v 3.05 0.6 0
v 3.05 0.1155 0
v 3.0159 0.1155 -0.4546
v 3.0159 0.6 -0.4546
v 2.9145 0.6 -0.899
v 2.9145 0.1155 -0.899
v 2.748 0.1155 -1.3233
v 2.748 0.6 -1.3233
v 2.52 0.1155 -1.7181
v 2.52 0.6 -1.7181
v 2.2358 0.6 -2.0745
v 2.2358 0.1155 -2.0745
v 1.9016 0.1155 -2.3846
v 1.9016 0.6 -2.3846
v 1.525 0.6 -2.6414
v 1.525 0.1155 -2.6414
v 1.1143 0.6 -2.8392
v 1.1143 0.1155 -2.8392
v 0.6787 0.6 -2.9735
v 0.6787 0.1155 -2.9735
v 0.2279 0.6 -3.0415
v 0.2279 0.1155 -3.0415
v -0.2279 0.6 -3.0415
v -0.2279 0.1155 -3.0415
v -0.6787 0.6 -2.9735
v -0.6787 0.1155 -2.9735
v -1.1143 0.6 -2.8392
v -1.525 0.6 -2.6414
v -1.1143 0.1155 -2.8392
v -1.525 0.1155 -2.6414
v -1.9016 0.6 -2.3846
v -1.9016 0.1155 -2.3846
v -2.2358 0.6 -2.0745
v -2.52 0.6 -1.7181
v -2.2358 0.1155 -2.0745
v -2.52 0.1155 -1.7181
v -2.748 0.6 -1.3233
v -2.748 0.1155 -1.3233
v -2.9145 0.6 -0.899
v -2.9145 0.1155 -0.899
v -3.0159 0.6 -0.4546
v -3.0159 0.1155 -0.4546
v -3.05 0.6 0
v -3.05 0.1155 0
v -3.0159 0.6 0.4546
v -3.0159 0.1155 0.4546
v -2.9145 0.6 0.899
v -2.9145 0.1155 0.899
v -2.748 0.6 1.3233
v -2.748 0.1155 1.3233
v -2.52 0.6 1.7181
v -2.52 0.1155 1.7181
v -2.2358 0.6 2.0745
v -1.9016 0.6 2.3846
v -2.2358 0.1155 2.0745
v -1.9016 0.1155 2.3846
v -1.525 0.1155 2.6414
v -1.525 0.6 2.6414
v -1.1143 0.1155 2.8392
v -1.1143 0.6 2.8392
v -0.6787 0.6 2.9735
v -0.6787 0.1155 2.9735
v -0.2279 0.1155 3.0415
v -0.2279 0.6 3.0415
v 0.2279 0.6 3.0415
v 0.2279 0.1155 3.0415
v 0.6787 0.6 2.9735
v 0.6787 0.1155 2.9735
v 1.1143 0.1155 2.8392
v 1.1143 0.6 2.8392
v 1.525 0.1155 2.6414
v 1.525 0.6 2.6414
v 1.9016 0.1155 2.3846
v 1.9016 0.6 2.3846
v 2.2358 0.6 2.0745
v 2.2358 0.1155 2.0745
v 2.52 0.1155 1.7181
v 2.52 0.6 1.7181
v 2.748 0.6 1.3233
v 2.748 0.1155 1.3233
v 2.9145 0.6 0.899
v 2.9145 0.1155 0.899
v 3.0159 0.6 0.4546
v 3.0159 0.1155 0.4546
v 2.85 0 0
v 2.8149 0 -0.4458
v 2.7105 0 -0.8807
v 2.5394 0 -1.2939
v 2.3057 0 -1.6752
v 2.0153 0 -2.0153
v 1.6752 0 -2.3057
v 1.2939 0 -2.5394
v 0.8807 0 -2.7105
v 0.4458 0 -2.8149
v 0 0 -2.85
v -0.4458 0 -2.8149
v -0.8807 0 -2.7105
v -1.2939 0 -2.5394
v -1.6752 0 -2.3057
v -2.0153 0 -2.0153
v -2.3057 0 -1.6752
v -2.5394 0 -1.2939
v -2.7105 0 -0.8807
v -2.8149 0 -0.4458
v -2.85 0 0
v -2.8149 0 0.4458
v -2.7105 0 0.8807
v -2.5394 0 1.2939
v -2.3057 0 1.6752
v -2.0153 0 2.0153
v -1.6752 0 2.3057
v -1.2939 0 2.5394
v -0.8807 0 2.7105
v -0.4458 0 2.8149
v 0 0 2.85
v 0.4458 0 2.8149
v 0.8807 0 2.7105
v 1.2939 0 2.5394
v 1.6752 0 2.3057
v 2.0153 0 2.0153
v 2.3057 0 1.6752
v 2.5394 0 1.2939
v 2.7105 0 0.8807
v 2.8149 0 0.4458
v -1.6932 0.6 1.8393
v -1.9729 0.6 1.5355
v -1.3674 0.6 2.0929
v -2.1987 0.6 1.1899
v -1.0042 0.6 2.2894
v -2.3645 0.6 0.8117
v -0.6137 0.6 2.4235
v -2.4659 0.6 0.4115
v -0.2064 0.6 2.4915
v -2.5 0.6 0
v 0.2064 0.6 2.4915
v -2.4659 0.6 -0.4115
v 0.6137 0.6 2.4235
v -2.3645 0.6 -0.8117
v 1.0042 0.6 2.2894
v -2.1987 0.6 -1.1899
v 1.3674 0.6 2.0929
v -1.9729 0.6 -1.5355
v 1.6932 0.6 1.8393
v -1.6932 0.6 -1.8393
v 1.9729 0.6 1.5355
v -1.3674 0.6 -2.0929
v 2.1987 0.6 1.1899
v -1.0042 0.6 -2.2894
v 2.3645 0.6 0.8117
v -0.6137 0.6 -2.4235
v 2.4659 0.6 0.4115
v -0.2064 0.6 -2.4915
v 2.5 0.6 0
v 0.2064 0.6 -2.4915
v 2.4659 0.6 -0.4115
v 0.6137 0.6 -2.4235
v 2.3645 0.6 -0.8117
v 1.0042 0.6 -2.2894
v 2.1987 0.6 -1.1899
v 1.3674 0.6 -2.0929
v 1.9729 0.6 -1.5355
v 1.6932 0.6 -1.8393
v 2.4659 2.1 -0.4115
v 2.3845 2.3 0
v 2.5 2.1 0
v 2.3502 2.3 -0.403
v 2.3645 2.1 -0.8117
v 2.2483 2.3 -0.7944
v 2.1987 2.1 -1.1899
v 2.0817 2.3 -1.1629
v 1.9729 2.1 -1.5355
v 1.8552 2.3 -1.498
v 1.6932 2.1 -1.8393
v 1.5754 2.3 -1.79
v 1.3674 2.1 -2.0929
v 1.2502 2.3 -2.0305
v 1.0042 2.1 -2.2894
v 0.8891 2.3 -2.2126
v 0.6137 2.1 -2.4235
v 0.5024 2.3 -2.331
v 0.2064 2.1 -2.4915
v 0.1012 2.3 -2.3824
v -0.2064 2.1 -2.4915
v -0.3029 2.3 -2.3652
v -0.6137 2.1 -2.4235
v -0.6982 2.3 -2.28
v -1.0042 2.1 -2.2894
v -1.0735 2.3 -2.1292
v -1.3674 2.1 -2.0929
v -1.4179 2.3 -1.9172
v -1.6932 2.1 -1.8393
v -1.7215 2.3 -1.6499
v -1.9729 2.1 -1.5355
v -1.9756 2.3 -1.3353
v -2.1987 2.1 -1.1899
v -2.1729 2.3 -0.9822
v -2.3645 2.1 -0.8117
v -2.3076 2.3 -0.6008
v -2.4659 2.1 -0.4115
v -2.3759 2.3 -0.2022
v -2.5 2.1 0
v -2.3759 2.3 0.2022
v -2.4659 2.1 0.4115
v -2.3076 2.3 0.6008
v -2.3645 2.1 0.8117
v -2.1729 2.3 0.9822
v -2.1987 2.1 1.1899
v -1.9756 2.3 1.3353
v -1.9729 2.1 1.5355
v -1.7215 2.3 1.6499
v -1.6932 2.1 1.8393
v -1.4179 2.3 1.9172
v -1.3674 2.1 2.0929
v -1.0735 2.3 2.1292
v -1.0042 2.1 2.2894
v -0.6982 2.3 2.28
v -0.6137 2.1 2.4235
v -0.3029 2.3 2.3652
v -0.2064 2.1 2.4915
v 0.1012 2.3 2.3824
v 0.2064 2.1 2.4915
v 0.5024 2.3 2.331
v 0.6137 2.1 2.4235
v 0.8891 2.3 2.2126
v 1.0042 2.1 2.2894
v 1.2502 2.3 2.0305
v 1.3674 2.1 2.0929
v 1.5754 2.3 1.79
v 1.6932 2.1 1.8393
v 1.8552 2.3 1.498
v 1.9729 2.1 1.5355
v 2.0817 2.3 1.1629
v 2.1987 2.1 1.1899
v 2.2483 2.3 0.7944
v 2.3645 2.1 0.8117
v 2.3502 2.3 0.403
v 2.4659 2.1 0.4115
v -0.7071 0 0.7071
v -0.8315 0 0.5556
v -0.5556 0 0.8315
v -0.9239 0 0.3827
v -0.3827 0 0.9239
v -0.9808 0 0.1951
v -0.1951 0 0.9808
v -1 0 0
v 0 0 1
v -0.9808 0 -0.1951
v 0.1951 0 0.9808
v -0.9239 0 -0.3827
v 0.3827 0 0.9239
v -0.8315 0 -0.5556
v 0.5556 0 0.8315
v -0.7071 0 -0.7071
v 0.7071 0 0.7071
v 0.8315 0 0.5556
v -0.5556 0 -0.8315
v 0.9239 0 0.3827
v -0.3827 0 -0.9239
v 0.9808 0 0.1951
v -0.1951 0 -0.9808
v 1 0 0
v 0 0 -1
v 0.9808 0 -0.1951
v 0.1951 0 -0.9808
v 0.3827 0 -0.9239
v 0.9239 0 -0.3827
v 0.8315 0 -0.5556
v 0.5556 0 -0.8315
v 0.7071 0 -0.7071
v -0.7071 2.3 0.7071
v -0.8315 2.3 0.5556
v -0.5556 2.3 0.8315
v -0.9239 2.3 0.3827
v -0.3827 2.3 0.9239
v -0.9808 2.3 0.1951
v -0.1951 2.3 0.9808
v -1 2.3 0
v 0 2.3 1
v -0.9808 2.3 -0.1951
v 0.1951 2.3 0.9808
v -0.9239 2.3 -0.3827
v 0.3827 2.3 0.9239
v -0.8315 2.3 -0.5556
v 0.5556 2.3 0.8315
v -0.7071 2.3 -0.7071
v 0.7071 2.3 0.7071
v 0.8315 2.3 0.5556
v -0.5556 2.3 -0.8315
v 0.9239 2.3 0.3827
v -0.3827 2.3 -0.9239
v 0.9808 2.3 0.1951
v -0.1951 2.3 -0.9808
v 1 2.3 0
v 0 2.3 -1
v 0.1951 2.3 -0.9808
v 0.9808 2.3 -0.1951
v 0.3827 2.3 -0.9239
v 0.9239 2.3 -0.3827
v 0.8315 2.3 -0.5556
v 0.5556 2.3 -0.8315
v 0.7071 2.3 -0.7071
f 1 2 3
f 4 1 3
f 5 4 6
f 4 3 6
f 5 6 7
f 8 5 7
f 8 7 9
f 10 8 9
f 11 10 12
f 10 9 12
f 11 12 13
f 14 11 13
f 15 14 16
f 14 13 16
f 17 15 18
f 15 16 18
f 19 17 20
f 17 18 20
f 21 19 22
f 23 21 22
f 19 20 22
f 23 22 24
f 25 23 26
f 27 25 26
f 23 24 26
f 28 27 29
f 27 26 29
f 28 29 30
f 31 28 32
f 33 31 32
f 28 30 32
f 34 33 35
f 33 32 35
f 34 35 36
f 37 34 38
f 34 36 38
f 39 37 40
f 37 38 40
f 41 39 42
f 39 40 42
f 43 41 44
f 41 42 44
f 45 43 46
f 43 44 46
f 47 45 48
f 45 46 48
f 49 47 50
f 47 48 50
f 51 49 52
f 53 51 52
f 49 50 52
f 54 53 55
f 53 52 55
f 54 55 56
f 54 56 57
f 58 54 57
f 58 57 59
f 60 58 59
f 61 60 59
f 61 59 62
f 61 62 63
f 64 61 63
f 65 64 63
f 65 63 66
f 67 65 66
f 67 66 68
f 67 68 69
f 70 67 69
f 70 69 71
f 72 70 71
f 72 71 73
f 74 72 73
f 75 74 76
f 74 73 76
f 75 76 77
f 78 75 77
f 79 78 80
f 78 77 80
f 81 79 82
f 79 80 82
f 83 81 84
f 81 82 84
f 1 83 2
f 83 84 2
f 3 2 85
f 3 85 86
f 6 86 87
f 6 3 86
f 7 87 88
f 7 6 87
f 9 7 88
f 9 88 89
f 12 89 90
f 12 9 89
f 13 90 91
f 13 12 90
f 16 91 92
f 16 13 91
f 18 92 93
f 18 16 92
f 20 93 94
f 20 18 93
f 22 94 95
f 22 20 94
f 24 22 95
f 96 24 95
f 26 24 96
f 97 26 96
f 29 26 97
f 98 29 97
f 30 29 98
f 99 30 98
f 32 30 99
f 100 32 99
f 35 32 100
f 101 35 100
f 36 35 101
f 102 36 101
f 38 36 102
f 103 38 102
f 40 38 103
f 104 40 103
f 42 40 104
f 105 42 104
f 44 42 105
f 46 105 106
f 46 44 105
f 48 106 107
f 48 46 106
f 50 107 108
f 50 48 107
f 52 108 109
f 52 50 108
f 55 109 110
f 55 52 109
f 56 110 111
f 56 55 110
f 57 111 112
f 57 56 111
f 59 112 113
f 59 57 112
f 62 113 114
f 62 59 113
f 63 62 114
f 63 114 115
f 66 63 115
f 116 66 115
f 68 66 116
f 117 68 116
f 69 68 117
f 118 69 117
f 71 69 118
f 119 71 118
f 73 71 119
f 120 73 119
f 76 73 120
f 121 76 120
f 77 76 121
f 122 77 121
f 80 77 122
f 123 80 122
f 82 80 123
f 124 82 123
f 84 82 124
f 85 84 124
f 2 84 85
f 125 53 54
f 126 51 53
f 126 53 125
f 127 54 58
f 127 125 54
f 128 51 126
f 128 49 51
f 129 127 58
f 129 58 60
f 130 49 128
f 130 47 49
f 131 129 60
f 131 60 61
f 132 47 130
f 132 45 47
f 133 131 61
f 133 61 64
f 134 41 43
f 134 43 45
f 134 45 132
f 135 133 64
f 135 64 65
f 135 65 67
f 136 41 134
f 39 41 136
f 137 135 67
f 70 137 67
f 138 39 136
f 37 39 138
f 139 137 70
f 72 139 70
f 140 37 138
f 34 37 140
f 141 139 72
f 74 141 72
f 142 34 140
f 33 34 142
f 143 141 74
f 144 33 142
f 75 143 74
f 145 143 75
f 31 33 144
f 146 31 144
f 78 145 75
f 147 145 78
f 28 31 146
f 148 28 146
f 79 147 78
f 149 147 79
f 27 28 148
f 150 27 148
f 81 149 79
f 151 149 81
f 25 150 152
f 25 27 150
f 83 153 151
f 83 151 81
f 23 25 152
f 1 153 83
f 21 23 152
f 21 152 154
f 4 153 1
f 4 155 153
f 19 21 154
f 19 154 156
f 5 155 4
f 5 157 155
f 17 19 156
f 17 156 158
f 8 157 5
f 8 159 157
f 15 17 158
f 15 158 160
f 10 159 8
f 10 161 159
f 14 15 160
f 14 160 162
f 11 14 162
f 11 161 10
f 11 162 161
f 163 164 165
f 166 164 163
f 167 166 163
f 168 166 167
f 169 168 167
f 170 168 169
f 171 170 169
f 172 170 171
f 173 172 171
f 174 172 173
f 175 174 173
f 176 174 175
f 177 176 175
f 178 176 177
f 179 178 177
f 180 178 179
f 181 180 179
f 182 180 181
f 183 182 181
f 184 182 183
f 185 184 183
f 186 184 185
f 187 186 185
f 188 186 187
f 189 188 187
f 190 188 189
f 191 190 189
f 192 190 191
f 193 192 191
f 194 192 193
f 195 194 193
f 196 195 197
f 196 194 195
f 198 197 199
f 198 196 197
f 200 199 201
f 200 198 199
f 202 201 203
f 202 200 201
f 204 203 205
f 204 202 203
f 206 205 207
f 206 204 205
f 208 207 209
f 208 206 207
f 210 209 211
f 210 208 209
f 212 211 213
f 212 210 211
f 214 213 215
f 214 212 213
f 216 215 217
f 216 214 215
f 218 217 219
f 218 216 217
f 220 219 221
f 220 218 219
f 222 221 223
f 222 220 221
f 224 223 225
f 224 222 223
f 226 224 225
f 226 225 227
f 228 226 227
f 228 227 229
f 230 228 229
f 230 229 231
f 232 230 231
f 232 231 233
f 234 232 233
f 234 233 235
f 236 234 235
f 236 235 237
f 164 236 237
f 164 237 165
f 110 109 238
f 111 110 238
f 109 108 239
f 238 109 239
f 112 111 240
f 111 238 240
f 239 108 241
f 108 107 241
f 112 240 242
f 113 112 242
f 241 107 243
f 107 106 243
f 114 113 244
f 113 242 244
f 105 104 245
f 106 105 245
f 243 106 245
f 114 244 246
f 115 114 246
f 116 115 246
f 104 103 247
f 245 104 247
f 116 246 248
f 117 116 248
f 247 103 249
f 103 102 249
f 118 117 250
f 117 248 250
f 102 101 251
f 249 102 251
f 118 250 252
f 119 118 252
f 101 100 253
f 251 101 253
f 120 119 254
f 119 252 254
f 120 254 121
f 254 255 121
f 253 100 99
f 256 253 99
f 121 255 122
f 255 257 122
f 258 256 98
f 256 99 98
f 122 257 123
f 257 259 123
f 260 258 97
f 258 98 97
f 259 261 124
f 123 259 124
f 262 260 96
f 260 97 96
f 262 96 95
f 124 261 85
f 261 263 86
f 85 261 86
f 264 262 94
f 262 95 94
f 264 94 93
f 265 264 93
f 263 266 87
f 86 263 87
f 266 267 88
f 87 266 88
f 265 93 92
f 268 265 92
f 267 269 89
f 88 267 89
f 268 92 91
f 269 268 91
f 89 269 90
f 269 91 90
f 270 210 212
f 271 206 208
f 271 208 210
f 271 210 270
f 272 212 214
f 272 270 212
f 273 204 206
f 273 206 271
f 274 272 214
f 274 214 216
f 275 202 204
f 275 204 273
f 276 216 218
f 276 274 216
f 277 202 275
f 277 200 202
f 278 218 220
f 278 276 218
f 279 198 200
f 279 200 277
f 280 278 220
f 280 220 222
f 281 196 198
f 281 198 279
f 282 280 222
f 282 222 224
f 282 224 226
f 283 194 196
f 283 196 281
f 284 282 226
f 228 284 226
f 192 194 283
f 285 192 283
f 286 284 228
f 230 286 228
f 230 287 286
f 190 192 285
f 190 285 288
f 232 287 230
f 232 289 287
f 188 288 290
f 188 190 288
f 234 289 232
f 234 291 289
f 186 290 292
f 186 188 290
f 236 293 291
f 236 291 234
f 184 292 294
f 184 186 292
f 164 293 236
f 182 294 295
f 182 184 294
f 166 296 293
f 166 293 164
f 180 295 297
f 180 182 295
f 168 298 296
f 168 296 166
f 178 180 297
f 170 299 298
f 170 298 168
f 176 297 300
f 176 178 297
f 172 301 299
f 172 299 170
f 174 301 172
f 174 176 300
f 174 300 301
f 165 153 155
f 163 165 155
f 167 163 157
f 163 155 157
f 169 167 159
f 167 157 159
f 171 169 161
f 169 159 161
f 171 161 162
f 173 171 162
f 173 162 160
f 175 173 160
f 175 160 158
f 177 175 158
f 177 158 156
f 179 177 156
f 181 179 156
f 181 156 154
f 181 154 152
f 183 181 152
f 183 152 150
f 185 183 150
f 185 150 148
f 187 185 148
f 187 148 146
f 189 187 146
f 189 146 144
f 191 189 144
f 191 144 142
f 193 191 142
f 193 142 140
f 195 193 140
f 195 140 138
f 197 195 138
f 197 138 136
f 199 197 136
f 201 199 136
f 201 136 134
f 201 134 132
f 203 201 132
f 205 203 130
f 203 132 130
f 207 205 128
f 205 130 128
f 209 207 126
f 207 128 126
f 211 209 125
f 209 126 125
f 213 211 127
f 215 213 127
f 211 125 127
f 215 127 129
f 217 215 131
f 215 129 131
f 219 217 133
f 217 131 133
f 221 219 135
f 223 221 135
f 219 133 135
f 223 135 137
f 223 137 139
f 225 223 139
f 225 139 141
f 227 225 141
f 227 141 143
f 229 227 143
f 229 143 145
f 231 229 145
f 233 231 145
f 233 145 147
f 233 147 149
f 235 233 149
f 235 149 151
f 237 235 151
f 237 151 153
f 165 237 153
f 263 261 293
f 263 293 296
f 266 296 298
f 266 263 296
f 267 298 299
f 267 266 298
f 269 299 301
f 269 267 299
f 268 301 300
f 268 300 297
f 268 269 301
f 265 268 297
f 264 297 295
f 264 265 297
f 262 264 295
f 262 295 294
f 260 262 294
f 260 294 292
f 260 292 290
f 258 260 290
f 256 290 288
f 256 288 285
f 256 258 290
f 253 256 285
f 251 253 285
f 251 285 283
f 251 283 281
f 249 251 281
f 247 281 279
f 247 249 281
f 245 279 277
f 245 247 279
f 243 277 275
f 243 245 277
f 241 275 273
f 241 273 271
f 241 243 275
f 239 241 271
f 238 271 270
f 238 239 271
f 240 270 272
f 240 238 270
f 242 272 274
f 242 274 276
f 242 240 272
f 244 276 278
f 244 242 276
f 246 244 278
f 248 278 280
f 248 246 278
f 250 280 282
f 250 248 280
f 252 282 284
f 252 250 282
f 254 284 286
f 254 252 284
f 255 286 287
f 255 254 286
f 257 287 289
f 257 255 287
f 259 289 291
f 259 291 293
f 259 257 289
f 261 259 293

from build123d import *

# Parameters (mm, degrees)
SKETCH_1_R             = 2.5
SKETCH_1_R_2           = 1
EXTRUDE_1_DEPTH        = 2.3
SKETCH_1_3_R           = 3.05
SKETCH_1_3_R_2         = 2.5
EXTRUDE_2_DEPTH        = 0.6
CHAMFER_1_SIZE         = 0.2
CHAMFER_1_SIZE2        = 0.115470054
CHAMFER_1_PART_2_SIZE  = 0.2
CHAMFER_1_PART_2_SIZE2 = 0.115470054


with BuildPart() as part:
    # Sketch 1 → Extrude 1 (new body)
    with BuildSketch(Plane(origin=(0, 0, 0), x_dir=(1, 0, 0), z_dir=(0, 1, 0))):
        Circle(SKETCH_1_R)
        Circle(SKETCH_1_R_2, mode=Mode.SUBTRACT)
    extrude(amount=EXTRUDE_1_DEPTH)

    # Sketch 1_3 → Extrude 2 (add)
    with BuildSketch(Plane(origin=(0, 0, 0), x_dir=(1, 0, 0), z_dir=(0, 1, 0))):
        Circle(SKETCH_1_3_R)
        Circle(SKETCH_1_3_R_2, mode=Mode.SUBTRACT)
    extrude(amount=EXTRUDE_2_DEPTH)

    # Chamfer 1
    chamfer_1_edges = [part.edges().sort_by_distance(p)[0] for p in [
        (-2.5, 2.3, 0),
    ]]
    chamfer_1_side = [part.faces().sort_by_distance(p)[0] for p in [
        (-2.5, 1.45, 0),
    ]]
    chamfer(chamfer_1_edges, length=CHAMFER_1_SIZE, length2=CHAMFER_1_SIZE2, reference=chamfer_1_side[0])

    # Chamfer 1 part 2
    chamfer_1_part_2_edges = [part.edges().sort_by_distance(p)[0] for p in [
        (-3.05, 0, 0),
    ]]
    chamfer_1_part_2_side = [part.faces().sort_by_distance(p)[0] for p in [
        (-2.963732973, 0, 0),
    ]]
    chamfer(chamfer_1_part_2_edges, length=CHAMFER_1_PART_2_SIZE, length2=CHAMFER_1_PART_2_SIZE2, reference=chamfer_1_part_2_side[0])


solid = part.part
